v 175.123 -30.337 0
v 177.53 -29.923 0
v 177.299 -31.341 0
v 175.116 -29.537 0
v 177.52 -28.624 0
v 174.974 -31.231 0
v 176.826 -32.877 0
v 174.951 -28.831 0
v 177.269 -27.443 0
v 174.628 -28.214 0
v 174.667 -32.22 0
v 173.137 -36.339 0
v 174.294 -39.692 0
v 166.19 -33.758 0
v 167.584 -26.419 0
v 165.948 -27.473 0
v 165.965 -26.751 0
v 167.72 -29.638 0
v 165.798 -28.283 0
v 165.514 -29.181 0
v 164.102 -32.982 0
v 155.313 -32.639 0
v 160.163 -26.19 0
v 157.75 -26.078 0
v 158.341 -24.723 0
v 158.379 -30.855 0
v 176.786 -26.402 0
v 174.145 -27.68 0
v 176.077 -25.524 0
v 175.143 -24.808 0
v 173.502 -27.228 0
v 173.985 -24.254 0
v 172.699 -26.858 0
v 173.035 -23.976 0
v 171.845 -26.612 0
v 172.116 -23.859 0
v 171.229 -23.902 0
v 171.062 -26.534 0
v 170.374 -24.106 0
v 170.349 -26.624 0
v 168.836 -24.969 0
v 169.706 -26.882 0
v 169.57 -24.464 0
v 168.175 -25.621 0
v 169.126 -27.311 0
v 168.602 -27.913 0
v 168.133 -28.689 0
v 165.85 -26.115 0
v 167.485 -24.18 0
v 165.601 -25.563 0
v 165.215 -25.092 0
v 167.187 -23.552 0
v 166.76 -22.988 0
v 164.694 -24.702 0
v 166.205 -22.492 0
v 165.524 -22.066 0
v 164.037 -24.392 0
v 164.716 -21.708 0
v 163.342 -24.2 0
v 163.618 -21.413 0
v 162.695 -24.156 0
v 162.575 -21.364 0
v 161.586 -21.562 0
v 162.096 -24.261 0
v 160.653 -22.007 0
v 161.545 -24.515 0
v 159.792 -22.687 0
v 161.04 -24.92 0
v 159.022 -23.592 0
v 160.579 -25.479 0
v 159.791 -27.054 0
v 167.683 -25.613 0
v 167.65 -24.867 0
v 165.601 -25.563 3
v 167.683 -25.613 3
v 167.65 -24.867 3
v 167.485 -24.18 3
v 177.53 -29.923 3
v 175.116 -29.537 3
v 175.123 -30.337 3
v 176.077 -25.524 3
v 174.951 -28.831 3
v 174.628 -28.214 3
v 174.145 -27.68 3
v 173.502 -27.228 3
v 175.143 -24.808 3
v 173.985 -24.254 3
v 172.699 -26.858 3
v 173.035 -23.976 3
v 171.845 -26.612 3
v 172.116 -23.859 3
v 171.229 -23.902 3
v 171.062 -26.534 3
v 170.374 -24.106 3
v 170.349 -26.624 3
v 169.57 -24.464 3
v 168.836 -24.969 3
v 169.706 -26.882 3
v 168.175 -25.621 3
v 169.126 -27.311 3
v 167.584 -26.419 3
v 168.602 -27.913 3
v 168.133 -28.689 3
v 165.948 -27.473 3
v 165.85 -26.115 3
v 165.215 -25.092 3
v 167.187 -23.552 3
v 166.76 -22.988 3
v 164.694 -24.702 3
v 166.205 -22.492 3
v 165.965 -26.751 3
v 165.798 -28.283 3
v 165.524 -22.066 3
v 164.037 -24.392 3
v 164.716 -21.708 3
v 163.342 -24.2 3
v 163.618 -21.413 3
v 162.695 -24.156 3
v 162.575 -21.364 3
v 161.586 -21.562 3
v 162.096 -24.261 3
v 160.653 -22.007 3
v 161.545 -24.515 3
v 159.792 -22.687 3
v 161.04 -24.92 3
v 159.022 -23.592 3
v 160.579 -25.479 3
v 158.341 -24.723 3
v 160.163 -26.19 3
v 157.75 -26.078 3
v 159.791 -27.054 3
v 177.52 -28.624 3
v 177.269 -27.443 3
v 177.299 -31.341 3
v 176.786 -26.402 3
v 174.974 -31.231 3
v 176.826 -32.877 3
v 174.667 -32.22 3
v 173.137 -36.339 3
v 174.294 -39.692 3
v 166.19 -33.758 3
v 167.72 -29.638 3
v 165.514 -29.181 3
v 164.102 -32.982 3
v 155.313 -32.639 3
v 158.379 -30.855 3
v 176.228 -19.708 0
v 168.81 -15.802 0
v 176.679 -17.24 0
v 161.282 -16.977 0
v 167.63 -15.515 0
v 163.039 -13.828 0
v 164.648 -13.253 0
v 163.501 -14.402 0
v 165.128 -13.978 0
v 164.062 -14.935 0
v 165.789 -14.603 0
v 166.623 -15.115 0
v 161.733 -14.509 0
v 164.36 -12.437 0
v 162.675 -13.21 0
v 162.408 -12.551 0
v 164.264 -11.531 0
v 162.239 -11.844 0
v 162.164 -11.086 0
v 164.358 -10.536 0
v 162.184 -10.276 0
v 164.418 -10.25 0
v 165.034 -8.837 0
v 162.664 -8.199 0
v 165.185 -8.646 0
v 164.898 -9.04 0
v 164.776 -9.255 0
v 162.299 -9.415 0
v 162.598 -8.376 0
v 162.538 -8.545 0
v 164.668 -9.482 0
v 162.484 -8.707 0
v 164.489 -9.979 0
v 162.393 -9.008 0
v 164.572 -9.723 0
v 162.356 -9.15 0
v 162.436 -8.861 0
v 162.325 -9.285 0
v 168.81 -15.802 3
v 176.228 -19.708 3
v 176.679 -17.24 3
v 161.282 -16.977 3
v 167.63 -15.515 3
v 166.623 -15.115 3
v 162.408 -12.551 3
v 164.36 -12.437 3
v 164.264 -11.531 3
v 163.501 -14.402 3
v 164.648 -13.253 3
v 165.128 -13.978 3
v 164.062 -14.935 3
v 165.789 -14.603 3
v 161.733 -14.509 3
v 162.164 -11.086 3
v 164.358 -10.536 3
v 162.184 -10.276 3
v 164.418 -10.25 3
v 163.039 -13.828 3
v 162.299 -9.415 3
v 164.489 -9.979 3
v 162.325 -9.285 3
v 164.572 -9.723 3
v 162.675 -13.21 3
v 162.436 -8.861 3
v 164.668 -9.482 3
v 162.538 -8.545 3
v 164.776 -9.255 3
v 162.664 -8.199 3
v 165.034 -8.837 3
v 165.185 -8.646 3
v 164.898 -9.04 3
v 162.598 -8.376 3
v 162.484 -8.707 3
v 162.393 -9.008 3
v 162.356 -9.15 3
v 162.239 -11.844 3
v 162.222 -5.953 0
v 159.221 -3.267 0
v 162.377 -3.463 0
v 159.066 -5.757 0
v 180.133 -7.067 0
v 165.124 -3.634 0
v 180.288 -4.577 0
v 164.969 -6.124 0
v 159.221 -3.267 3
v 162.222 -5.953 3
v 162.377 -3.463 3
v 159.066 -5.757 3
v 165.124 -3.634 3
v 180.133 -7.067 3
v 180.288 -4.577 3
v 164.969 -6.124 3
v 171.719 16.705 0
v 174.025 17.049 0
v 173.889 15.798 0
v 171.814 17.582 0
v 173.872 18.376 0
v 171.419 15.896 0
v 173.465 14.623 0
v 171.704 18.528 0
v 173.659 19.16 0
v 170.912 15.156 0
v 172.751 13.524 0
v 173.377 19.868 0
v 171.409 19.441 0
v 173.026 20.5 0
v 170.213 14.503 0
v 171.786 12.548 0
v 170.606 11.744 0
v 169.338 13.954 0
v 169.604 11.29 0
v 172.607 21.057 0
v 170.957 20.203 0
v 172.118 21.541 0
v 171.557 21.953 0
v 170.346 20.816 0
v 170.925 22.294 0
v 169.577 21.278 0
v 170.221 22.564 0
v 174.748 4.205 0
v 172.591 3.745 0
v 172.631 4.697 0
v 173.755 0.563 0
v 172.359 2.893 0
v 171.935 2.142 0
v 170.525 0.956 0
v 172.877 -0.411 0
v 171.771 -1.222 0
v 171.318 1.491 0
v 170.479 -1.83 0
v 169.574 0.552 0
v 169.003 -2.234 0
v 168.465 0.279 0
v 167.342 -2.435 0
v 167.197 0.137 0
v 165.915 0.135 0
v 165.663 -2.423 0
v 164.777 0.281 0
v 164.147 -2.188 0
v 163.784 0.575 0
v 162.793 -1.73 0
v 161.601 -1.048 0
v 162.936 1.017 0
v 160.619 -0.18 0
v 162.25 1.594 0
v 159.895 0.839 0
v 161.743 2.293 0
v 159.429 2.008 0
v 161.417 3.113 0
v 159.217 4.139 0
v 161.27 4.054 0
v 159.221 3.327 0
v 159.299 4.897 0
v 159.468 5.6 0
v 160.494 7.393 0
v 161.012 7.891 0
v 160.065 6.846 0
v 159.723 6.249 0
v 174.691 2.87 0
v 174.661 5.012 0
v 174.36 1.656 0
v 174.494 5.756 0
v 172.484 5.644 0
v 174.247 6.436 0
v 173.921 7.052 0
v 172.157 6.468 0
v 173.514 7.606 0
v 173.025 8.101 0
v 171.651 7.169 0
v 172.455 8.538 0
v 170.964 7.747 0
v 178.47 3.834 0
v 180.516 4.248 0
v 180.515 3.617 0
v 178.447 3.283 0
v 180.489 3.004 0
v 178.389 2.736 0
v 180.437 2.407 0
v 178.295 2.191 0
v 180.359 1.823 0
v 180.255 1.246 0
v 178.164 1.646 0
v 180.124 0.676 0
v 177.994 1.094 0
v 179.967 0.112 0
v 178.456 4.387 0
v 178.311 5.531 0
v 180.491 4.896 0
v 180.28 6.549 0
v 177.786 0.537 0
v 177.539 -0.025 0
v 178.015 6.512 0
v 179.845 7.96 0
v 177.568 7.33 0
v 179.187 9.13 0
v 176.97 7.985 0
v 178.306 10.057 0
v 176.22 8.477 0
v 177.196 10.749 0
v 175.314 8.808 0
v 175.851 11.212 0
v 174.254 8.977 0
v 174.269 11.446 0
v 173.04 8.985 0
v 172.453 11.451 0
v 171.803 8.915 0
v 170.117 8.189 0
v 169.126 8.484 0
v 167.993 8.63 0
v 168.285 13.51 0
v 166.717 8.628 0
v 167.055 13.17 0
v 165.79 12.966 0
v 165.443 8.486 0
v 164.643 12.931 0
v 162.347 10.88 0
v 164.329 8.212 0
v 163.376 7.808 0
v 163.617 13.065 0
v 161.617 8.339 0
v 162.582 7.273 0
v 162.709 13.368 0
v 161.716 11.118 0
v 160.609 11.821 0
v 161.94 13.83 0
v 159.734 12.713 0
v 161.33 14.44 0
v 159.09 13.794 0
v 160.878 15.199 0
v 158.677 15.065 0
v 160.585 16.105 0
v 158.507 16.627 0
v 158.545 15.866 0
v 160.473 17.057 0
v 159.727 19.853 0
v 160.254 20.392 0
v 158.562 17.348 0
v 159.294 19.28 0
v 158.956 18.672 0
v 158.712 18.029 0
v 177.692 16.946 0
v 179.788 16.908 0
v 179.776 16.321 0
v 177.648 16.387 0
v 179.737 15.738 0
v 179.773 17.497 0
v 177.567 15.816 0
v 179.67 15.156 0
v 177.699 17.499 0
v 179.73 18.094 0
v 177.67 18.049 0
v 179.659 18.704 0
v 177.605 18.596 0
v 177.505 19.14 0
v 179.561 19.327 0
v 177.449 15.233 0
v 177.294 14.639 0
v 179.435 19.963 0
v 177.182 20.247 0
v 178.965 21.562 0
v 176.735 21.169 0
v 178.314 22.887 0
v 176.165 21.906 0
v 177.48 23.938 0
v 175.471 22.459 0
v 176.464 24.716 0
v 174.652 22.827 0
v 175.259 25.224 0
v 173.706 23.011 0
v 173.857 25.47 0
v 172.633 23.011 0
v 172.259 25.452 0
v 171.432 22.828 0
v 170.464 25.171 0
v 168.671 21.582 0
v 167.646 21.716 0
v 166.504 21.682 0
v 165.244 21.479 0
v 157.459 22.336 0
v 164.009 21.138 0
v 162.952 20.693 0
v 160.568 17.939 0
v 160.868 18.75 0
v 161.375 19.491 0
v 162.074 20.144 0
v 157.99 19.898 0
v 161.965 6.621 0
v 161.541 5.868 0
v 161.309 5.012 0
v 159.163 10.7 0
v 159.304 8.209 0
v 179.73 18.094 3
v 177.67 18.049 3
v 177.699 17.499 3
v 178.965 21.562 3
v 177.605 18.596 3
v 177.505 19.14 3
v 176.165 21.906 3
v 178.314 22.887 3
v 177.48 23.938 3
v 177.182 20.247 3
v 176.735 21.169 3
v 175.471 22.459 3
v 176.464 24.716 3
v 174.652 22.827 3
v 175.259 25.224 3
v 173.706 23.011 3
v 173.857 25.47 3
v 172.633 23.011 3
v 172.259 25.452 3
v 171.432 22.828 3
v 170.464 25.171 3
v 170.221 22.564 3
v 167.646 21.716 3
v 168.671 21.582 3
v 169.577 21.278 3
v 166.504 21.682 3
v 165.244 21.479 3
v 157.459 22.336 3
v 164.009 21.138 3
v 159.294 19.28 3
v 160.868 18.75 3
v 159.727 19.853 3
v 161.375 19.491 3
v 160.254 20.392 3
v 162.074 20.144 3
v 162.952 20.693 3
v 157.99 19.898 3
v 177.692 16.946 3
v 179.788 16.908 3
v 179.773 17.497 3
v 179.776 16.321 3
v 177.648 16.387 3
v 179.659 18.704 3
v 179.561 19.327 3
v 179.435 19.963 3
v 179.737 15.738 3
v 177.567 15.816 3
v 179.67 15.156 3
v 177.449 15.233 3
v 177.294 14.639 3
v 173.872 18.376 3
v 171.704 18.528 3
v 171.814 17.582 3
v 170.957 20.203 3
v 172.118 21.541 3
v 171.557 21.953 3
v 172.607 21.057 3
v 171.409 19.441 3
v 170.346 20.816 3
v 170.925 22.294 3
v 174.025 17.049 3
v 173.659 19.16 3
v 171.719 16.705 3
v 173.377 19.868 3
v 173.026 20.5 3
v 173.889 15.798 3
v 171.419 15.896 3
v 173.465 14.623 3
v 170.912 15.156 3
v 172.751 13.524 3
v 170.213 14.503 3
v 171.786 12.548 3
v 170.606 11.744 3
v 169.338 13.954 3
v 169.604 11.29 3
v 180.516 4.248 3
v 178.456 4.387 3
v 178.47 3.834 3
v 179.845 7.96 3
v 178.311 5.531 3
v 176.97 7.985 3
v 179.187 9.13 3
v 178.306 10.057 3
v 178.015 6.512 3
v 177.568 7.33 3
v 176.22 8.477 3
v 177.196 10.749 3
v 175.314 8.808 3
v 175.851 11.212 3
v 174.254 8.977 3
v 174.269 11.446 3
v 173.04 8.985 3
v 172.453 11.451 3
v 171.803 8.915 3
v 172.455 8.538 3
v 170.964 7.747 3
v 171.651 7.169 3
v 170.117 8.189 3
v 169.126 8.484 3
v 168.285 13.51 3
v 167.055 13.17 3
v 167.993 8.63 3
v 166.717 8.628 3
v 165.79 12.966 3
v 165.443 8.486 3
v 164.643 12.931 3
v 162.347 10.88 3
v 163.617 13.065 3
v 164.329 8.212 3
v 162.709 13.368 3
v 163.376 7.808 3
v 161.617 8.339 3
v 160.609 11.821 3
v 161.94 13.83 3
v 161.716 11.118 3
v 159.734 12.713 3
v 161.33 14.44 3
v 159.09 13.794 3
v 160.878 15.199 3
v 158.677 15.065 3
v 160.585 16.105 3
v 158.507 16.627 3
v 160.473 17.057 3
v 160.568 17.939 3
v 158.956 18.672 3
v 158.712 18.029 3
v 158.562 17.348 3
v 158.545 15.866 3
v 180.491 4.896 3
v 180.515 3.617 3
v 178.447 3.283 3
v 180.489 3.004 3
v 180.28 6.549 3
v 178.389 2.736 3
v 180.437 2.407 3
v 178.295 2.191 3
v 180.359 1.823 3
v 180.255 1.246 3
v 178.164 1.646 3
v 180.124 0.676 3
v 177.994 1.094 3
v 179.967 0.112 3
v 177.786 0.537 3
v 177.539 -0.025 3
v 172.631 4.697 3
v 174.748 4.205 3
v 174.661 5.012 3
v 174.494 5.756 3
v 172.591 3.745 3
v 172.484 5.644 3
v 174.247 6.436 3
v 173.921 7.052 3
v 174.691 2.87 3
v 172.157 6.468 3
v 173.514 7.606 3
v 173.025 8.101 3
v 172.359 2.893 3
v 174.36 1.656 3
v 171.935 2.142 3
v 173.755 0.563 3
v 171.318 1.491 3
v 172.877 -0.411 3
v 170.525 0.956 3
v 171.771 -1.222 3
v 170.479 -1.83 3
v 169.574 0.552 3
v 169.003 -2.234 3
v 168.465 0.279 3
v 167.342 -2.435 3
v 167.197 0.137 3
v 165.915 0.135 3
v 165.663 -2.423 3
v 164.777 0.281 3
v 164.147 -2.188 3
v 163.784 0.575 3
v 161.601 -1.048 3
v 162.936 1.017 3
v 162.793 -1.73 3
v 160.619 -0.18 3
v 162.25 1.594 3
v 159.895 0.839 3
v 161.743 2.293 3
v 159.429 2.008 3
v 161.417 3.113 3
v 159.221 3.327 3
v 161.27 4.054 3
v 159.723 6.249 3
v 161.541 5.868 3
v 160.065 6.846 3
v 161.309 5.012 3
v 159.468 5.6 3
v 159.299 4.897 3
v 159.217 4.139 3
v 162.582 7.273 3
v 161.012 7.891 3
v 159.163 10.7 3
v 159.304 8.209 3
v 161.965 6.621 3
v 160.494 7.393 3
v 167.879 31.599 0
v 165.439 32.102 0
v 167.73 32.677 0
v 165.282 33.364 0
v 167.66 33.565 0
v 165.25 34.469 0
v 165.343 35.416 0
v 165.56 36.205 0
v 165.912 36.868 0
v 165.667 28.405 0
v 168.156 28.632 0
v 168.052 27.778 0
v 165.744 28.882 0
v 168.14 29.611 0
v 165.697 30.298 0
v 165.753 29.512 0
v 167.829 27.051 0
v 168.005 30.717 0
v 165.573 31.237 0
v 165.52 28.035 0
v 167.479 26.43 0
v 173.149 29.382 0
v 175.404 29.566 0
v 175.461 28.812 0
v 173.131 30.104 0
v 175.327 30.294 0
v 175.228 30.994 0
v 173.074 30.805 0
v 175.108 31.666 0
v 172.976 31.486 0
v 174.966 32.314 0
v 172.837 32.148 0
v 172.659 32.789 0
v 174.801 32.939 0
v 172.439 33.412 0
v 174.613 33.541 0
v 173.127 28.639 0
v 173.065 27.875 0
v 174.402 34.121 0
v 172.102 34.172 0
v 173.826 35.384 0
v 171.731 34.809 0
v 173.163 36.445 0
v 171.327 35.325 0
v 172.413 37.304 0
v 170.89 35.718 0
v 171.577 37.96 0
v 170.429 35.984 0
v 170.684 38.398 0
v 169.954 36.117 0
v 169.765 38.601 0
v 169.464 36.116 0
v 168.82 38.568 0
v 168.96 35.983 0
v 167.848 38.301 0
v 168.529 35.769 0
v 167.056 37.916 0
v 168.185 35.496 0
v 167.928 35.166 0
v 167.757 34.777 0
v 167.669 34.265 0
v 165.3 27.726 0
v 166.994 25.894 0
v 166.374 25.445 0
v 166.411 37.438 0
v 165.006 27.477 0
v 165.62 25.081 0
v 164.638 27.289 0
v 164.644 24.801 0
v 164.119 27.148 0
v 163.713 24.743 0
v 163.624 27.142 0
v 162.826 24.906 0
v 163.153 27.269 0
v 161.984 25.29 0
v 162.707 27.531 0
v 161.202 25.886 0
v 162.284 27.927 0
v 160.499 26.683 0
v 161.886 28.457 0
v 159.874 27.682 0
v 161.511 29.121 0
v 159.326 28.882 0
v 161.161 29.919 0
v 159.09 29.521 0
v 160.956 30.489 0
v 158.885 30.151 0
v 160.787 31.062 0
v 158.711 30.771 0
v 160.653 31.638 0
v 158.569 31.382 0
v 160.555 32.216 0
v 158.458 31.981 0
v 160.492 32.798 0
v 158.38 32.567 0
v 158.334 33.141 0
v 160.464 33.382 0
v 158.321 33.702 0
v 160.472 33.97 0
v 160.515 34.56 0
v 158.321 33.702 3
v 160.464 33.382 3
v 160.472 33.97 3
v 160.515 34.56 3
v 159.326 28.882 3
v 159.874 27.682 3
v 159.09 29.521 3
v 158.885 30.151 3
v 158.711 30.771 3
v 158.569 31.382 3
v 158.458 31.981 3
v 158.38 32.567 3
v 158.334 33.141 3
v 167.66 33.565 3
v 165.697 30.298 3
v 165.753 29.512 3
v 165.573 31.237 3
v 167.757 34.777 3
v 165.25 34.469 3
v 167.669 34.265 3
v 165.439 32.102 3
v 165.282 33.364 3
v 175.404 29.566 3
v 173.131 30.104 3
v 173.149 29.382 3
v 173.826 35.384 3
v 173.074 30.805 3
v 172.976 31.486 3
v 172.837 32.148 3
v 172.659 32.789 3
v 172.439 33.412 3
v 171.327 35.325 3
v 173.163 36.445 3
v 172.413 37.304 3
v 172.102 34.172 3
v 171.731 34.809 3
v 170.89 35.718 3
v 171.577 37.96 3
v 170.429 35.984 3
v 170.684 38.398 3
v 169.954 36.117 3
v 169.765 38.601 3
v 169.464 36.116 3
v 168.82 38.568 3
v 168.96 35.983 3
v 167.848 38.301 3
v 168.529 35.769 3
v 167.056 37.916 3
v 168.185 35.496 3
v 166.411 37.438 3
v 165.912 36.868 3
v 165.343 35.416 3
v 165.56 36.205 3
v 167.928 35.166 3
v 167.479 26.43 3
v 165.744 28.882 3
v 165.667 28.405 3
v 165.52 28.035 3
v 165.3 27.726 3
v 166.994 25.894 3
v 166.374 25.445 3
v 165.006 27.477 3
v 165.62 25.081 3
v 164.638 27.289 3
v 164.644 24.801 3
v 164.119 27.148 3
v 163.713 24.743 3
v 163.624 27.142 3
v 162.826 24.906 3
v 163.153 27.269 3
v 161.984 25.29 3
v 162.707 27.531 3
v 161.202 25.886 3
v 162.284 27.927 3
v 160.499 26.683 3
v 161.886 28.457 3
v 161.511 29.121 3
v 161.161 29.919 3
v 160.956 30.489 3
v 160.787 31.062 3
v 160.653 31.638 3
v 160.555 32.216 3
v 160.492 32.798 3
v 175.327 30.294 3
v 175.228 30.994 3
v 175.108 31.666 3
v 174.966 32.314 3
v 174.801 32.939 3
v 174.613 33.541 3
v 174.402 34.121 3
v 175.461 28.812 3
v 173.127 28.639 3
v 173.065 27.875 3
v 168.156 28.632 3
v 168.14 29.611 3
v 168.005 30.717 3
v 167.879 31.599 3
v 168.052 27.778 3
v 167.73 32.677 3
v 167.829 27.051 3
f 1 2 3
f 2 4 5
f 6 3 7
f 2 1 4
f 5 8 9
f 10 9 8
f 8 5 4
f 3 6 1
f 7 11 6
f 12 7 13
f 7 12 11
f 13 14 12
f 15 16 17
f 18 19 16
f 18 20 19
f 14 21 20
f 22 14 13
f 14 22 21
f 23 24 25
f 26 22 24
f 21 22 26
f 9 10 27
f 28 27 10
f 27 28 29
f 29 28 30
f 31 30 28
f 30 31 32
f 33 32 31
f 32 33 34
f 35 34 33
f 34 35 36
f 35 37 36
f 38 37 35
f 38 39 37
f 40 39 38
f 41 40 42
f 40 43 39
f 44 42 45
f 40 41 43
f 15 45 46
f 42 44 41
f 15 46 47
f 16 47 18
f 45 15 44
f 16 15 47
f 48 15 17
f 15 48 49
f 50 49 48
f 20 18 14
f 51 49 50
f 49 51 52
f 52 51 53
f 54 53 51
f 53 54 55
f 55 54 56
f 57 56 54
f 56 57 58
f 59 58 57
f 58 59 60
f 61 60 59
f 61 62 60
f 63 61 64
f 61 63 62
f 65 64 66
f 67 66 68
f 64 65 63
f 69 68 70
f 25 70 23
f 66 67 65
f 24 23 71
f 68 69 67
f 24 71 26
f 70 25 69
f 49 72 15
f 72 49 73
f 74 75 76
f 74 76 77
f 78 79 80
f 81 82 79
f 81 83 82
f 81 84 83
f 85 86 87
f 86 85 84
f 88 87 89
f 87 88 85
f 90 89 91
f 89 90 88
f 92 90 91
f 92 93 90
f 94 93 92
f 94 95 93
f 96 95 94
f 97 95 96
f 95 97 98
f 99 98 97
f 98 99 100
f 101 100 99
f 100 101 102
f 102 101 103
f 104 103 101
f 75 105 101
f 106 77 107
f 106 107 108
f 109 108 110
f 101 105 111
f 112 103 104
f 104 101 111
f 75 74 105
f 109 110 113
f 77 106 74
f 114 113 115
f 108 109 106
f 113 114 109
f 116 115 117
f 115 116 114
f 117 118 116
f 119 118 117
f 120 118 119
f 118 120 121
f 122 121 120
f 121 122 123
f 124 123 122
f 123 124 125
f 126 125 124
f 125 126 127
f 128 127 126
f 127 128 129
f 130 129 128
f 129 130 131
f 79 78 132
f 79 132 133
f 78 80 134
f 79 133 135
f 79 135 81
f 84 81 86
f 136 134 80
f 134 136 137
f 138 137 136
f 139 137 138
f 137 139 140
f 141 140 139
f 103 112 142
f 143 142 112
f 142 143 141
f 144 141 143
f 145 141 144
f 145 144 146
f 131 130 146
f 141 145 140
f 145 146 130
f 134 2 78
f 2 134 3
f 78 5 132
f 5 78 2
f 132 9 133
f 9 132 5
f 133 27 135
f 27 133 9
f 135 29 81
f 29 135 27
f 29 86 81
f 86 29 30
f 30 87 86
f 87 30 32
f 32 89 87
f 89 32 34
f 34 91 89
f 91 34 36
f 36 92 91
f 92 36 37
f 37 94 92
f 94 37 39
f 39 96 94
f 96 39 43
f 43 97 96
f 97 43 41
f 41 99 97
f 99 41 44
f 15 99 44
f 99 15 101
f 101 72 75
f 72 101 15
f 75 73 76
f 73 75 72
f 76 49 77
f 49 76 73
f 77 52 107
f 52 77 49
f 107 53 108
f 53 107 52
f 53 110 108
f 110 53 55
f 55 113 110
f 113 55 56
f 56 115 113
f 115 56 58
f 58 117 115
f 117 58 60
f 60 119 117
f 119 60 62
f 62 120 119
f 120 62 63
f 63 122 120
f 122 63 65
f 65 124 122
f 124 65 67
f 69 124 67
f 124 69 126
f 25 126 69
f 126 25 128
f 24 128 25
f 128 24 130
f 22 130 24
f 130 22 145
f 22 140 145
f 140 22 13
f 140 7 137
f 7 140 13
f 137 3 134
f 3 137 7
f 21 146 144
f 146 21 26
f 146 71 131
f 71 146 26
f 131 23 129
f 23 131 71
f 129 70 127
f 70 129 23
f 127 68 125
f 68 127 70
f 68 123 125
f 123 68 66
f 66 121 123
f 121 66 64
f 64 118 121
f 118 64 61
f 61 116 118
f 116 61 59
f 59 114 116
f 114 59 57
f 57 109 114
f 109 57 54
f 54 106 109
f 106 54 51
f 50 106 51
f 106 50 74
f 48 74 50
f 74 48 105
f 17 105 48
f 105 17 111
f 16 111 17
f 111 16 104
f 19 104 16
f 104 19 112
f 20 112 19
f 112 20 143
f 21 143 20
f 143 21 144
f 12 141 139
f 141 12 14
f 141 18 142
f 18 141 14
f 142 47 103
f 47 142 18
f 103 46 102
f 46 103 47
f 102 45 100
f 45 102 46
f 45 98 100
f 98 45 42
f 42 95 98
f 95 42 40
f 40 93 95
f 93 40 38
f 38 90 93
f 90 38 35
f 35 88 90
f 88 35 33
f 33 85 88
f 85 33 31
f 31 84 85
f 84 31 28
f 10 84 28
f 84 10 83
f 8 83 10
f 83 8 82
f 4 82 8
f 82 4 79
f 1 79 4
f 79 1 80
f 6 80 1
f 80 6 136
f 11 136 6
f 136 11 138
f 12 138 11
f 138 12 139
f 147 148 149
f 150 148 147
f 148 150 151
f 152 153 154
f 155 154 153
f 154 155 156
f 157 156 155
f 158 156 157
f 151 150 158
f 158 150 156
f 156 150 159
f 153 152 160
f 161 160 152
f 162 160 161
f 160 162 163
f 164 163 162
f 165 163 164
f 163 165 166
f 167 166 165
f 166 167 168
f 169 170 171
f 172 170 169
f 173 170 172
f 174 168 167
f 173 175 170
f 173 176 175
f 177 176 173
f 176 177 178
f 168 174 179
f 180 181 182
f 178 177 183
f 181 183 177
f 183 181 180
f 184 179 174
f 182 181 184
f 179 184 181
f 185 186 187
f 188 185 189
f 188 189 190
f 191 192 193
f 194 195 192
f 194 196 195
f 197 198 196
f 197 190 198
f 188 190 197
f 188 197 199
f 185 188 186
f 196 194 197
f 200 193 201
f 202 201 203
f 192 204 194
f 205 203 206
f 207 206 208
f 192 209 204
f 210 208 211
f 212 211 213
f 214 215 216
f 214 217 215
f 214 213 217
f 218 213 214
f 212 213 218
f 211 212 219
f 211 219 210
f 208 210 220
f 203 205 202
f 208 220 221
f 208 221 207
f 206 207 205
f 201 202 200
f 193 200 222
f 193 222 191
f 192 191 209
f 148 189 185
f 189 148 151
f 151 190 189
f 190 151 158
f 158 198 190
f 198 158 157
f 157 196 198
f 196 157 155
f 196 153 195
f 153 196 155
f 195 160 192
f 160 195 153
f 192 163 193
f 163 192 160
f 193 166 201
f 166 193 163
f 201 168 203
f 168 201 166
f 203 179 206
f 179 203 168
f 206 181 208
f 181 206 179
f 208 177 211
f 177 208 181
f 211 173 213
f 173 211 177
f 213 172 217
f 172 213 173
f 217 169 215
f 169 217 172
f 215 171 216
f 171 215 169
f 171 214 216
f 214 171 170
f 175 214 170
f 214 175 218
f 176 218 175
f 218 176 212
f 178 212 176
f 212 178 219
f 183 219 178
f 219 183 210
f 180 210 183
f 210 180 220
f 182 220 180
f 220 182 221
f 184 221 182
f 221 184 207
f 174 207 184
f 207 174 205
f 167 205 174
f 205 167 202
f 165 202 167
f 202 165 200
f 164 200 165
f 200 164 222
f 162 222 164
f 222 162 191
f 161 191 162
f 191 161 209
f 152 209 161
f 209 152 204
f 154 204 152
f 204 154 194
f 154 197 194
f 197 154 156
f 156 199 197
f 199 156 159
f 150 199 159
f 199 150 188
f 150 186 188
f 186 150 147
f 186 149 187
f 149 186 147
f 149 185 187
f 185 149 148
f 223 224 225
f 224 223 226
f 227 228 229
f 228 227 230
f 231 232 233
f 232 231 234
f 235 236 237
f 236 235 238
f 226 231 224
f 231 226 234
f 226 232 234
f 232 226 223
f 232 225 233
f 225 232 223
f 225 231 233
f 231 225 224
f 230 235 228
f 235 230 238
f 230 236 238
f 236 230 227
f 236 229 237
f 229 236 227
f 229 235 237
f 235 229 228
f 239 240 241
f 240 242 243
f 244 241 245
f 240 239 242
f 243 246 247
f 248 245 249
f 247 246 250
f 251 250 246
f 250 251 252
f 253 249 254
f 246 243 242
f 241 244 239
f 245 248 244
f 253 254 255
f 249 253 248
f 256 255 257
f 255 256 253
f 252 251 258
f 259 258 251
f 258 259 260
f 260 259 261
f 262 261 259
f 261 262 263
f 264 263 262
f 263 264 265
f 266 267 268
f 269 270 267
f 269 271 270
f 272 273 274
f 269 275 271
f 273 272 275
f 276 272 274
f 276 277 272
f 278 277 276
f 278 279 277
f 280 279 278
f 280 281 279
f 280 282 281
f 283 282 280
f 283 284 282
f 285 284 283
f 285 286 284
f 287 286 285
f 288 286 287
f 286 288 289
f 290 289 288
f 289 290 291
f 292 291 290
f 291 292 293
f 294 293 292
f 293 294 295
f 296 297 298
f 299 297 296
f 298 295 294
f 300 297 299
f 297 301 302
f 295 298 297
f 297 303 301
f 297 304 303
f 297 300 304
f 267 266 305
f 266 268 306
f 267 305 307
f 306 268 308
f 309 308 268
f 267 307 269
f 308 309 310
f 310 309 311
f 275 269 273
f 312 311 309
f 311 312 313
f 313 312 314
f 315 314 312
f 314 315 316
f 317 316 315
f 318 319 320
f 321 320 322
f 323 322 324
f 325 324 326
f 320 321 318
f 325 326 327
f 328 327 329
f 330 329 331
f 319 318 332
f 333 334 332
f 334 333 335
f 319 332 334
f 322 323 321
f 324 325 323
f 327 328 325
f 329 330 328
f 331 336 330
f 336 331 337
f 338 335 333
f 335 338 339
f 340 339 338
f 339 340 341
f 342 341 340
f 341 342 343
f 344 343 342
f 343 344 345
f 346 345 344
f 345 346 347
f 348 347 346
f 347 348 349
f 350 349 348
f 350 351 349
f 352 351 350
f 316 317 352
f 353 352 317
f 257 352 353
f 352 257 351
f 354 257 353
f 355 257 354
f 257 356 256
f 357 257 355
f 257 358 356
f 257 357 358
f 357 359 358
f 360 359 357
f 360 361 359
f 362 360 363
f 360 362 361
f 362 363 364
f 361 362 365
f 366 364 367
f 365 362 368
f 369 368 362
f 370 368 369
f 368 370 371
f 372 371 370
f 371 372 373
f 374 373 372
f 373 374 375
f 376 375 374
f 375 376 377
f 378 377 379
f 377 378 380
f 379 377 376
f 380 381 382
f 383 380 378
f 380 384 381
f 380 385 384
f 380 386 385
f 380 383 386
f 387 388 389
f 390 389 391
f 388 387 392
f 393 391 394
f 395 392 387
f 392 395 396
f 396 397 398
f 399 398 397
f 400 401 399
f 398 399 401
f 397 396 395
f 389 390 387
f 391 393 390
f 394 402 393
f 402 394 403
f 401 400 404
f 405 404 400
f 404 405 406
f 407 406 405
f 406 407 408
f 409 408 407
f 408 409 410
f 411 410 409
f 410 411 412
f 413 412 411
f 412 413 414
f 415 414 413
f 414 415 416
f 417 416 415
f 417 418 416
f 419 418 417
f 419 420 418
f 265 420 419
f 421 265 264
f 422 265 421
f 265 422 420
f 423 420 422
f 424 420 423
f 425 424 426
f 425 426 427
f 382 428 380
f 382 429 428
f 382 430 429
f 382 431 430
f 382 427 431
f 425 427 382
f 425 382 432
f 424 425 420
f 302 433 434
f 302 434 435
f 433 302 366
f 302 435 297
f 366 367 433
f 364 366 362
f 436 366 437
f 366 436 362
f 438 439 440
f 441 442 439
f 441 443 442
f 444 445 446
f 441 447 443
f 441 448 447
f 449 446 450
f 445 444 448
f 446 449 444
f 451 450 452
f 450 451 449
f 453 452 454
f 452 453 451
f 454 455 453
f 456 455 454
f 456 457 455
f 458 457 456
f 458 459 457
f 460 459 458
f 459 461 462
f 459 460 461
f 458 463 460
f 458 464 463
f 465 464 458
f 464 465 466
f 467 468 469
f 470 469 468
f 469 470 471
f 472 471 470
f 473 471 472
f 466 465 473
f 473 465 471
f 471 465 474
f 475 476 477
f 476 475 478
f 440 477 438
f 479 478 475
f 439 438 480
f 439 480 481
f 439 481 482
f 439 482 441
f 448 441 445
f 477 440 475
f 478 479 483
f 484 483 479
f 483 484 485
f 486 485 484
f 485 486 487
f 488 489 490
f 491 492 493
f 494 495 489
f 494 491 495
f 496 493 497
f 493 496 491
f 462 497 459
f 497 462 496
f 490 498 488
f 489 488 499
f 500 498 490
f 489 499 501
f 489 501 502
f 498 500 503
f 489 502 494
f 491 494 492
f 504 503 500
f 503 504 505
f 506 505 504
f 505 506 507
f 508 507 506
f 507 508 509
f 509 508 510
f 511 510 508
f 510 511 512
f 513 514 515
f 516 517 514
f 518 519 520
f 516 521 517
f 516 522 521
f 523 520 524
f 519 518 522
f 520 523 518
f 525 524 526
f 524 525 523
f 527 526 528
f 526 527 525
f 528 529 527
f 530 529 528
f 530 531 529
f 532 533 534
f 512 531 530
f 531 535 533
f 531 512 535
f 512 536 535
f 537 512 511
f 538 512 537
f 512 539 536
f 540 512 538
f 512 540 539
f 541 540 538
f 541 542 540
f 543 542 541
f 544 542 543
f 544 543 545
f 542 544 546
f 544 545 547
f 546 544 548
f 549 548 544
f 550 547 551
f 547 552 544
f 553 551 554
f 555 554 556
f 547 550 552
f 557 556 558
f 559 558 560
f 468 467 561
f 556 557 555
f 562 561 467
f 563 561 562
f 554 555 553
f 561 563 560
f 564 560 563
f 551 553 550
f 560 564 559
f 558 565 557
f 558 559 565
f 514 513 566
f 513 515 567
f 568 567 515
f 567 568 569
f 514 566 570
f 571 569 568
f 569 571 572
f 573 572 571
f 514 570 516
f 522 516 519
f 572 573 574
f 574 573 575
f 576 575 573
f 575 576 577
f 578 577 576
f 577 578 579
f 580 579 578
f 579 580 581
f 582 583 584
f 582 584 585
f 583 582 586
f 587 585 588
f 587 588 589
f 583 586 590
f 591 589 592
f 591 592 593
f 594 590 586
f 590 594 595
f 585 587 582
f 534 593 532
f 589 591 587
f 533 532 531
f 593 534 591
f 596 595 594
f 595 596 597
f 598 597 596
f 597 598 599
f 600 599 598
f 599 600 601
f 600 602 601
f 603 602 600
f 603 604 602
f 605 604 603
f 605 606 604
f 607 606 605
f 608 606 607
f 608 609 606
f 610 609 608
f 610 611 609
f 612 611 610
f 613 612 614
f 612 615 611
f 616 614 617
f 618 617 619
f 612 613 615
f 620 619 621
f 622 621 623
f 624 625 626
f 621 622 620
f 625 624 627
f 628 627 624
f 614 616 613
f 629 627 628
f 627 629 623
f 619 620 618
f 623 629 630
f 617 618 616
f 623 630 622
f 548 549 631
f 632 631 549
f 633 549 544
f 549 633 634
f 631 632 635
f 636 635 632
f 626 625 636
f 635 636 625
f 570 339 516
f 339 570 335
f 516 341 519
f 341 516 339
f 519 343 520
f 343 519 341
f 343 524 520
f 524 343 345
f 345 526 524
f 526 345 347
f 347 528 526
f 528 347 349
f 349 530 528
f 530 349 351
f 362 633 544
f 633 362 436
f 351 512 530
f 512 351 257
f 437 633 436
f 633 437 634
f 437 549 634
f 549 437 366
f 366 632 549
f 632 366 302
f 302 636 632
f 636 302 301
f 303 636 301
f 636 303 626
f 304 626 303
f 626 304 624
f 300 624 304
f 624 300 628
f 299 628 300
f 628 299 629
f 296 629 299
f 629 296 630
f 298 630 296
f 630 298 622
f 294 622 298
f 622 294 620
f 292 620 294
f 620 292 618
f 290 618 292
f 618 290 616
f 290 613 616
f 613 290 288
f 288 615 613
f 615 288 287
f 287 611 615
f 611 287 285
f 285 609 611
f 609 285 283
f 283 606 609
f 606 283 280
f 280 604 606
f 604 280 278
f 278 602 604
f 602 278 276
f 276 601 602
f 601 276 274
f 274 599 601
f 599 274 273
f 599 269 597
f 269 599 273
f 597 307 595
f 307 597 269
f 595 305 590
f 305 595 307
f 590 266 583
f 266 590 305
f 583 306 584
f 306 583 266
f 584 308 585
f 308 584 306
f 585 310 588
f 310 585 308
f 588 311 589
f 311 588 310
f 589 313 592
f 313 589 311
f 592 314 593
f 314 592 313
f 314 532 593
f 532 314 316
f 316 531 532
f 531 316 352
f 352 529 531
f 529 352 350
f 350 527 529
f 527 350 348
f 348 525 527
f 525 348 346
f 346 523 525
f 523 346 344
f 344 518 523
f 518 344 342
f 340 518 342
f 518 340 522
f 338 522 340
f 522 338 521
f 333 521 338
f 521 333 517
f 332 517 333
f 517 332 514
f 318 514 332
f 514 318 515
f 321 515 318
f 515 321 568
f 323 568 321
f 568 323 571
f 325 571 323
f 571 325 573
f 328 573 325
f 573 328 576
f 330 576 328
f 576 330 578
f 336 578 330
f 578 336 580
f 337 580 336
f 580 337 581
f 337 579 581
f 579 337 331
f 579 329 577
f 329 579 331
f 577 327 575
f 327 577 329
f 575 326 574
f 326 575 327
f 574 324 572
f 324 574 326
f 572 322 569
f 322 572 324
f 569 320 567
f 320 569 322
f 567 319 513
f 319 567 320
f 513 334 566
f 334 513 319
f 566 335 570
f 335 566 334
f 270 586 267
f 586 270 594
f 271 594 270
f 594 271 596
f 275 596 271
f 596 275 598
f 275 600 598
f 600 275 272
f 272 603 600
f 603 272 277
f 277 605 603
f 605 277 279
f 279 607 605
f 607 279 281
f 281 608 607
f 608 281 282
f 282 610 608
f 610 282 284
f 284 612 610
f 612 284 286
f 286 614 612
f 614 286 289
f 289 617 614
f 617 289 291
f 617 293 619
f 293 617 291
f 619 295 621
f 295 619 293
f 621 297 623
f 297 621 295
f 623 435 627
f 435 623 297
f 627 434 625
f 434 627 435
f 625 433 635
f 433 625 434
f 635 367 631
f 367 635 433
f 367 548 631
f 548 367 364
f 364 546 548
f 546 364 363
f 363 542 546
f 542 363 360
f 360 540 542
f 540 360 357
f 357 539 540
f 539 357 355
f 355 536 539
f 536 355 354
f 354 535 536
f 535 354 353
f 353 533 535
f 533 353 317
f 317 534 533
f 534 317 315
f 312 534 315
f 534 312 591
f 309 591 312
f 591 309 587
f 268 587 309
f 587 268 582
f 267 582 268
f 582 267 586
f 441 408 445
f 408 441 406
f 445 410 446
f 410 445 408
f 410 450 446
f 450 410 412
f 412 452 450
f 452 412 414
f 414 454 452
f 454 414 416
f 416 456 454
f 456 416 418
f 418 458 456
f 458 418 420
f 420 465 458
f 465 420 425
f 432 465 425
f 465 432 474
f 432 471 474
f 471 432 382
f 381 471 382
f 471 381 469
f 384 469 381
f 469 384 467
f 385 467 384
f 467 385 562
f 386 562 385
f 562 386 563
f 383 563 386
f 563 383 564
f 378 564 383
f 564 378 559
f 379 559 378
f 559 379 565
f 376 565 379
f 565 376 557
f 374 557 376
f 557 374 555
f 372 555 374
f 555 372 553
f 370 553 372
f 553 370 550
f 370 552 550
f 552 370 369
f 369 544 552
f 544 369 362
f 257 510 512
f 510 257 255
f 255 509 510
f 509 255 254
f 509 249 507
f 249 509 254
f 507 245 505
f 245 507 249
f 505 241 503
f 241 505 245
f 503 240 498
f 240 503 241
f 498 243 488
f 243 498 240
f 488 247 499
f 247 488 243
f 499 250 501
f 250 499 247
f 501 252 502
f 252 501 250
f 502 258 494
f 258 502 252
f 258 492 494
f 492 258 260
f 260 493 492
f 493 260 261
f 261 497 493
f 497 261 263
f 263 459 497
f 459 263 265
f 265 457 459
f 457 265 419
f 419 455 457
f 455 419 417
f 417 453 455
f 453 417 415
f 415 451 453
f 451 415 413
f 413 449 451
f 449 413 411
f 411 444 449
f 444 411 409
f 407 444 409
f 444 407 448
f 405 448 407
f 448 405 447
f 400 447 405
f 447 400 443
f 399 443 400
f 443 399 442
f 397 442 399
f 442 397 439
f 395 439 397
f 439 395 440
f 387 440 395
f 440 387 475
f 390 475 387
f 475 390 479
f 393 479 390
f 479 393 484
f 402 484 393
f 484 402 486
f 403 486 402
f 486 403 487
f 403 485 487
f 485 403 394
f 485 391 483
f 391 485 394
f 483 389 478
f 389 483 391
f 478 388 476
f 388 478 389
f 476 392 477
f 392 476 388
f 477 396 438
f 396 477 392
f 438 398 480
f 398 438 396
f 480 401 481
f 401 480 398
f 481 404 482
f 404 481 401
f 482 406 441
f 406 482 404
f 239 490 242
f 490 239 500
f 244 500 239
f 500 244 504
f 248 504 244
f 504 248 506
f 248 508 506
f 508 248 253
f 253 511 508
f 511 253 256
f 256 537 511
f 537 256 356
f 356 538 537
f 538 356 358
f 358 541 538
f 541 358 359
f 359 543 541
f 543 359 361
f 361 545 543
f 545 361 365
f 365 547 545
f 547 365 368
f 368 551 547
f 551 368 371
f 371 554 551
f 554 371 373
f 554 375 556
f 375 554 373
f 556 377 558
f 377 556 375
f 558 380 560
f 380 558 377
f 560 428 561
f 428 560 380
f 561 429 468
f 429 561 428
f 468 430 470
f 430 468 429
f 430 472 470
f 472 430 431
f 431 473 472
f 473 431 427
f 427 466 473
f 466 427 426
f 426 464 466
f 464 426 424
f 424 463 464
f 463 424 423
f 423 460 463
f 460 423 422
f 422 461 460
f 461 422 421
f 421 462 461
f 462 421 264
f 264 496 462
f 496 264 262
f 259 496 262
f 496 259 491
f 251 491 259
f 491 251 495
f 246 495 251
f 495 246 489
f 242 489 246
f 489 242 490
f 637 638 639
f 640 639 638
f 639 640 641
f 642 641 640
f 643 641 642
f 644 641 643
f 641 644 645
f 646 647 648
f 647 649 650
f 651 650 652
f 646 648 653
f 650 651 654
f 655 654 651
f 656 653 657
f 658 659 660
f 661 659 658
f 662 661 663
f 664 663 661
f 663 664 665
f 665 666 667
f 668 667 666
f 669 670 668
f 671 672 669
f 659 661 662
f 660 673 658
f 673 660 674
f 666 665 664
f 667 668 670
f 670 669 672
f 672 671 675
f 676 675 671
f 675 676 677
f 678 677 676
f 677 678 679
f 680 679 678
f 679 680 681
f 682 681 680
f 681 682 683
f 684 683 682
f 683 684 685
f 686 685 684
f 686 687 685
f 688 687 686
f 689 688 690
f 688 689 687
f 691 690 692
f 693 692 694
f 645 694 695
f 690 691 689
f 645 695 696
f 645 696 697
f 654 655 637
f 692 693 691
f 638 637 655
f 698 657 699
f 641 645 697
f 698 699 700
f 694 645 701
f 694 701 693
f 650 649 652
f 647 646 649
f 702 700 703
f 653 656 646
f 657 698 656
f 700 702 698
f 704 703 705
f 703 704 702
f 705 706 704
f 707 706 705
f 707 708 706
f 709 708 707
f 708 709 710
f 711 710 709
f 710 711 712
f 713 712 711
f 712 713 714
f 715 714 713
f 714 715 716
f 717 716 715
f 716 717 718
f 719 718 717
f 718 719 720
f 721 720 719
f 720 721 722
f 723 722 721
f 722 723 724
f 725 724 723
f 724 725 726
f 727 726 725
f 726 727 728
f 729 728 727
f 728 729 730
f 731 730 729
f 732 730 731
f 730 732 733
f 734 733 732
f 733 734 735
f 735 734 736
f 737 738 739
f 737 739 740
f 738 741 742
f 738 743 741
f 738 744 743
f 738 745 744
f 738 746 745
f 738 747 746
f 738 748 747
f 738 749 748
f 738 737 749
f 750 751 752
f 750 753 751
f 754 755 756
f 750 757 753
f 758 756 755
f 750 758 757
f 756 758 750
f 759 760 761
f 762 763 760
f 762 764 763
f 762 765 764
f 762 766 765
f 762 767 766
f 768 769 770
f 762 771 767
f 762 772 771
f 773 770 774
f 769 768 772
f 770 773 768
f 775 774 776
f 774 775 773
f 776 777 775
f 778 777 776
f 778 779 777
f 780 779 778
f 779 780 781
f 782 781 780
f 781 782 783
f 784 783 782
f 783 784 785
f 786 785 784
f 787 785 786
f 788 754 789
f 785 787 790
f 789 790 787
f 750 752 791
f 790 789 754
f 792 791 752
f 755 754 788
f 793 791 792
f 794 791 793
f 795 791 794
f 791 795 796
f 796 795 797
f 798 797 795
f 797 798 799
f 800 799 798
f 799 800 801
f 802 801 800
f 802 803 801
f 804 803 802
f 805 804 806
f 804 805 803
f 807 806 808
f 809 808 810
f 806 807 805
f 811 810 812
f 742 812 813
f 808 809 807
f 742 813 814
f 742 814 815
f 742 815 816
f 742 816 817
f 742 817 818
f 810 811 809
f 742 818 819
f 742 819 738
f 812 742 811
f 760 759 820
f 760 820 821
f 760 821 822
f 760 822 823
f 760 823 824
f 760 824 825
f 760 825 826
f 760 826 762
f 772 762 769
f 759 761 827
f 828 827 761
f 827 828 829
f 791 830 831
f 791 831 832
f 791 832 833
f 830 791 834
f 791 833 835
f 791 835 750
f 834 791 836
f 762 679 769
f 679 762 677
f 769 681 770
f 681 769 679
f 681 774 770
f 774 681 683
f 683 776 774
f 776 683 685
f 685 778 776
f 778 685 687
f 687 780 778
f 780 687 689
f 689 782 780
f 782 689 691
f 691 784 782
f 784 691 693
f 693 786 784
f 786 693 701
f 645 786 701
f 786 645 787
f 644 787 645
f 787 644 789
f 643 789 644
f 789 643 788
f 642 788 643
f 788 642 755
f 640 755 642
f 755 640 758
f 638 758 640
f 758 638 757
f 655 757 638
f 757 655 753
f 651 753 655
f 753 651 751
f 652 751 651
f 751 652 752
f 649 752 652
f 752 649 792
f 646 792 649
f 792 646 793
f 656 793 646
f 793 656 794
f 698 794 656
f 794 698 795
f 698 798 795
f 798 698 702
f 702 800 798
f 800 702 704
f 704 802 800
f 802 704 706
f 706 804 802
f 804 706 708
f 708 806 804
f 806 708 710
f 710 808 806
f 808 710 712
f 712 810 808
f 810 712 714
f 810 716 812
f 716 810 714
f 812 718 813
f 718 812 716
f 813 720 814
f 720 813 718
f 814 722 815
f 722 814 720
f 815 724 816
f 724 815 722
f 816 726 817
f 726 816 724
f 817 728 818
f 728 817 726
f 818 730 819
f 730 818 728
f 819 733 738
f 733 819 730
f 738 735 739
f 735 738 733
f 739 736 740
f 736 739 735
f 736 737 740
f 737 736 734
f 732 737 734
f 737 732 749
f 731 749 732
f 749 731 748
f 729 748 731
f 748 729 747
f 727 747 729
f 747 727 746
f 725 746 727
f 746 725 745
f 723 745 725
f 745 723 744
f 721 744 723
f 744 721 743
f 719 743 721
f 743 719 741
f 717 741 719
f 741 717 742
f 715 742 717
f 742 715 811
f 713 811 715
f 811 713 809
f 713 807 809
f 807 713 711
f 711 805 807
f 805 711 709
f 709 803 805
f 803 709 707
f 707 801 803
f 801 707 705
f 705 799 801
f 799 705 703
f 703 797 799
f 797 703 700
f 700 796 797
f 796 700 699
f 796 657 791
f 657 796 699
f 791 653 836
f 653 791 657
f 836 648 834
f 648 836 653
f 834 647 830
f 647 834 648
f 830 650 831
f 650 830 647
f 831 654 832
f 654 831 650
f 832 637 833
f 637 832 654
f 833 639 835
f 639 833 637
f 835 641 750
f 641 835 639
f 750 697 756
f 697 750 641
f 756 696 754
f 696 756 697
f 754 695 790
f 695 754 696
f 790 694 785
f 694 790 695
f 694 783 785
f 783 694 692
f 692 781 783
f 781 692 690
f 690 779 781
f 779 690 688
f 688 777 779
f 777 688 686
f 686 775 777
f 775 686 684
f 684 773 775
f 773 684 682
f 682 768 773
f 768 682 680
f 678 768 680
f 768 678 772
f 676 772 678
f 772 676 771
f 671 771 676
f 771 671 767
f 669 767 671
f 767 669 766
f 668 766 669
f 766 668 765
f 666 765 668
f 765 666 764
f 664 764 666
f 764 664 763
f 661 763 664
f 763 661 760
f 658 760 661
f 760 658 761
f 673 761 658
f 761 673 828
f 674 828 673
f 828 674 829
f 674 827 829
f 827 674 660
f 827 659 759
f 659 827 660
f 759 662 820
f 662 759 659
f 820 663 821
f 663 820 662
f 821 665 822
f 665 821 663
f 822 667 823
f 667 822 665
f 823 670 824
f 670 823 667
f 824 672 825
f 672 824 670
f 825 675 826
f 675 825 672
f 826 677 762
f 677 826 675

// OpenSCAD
union() {
	rotate(a = [0, 0, -10.19190807338594]) {
		translate(v = [170.0, 0, 0]) {
			rotate(a = [0, 0, 79.80809192661405]) {
				linear_extrude(height = 3) {
					text(font = "Forte", halign = "center", size = 20, text = "B", valign = "center");
				}
			}
		}
	}
	rotate(a = [0, 0, -5.176842196005559]) {
		translate(v = [170.0, 0, 0]) {
			rotate(a = [0, 0, 84.82315780399443]) {
				linear_extrude(height = 3) {
					text(font = "Forte", halign = "center", size = 20, text = "r", valign = "center");
				}
			}
		}
	}
	rotate(a = [0, 0, -1.7795395048769134]) {
		translate(v = [170.0, 0, 0]) {
			rotate(a = [0, 0, 88.22046049512309]) {
				linear_extrude(height = 3) {
					text(font = "Forte", halign = "center", size = 20, text = "i", valign = "center");
				}
			}
		}
	}
	rotate(a = [0, 0, 1.617763186251734]) {
		translate(v = [170.0, 0, 0]) {
			rotate(a = [0, 0, 91.61776318625174]) {
				linear_extrude(height = 3) {
					text(font = "Forte", halign = "center", size = 20, text = "g", valign = "center");
				}
			}
		}
	}
	rotate(a = [0, 0, 6.147500107756594]) {
		translate(v = [170.0, 0, 0]) {
			rotate(a = [0, 0, 96.1475001077566]) {
				linear_extrude(height = 3) {
					text(font = "Forte", halign = "center", size = 20, text = "g", valign = "center");
				}
			}
		}
	}
	rotate(a = [0, 0, 10.677237029261457]) {
		translate(v = [170.0, 0, 0]) {
			rotate(a = [0, 0, 100.67723702926146]) {
				linear_extrude(height = 3) {
					text(font = "Forte", halign = "center", size = 20, text = "s", valign = "center");
				}
			}
		}
	}
}
